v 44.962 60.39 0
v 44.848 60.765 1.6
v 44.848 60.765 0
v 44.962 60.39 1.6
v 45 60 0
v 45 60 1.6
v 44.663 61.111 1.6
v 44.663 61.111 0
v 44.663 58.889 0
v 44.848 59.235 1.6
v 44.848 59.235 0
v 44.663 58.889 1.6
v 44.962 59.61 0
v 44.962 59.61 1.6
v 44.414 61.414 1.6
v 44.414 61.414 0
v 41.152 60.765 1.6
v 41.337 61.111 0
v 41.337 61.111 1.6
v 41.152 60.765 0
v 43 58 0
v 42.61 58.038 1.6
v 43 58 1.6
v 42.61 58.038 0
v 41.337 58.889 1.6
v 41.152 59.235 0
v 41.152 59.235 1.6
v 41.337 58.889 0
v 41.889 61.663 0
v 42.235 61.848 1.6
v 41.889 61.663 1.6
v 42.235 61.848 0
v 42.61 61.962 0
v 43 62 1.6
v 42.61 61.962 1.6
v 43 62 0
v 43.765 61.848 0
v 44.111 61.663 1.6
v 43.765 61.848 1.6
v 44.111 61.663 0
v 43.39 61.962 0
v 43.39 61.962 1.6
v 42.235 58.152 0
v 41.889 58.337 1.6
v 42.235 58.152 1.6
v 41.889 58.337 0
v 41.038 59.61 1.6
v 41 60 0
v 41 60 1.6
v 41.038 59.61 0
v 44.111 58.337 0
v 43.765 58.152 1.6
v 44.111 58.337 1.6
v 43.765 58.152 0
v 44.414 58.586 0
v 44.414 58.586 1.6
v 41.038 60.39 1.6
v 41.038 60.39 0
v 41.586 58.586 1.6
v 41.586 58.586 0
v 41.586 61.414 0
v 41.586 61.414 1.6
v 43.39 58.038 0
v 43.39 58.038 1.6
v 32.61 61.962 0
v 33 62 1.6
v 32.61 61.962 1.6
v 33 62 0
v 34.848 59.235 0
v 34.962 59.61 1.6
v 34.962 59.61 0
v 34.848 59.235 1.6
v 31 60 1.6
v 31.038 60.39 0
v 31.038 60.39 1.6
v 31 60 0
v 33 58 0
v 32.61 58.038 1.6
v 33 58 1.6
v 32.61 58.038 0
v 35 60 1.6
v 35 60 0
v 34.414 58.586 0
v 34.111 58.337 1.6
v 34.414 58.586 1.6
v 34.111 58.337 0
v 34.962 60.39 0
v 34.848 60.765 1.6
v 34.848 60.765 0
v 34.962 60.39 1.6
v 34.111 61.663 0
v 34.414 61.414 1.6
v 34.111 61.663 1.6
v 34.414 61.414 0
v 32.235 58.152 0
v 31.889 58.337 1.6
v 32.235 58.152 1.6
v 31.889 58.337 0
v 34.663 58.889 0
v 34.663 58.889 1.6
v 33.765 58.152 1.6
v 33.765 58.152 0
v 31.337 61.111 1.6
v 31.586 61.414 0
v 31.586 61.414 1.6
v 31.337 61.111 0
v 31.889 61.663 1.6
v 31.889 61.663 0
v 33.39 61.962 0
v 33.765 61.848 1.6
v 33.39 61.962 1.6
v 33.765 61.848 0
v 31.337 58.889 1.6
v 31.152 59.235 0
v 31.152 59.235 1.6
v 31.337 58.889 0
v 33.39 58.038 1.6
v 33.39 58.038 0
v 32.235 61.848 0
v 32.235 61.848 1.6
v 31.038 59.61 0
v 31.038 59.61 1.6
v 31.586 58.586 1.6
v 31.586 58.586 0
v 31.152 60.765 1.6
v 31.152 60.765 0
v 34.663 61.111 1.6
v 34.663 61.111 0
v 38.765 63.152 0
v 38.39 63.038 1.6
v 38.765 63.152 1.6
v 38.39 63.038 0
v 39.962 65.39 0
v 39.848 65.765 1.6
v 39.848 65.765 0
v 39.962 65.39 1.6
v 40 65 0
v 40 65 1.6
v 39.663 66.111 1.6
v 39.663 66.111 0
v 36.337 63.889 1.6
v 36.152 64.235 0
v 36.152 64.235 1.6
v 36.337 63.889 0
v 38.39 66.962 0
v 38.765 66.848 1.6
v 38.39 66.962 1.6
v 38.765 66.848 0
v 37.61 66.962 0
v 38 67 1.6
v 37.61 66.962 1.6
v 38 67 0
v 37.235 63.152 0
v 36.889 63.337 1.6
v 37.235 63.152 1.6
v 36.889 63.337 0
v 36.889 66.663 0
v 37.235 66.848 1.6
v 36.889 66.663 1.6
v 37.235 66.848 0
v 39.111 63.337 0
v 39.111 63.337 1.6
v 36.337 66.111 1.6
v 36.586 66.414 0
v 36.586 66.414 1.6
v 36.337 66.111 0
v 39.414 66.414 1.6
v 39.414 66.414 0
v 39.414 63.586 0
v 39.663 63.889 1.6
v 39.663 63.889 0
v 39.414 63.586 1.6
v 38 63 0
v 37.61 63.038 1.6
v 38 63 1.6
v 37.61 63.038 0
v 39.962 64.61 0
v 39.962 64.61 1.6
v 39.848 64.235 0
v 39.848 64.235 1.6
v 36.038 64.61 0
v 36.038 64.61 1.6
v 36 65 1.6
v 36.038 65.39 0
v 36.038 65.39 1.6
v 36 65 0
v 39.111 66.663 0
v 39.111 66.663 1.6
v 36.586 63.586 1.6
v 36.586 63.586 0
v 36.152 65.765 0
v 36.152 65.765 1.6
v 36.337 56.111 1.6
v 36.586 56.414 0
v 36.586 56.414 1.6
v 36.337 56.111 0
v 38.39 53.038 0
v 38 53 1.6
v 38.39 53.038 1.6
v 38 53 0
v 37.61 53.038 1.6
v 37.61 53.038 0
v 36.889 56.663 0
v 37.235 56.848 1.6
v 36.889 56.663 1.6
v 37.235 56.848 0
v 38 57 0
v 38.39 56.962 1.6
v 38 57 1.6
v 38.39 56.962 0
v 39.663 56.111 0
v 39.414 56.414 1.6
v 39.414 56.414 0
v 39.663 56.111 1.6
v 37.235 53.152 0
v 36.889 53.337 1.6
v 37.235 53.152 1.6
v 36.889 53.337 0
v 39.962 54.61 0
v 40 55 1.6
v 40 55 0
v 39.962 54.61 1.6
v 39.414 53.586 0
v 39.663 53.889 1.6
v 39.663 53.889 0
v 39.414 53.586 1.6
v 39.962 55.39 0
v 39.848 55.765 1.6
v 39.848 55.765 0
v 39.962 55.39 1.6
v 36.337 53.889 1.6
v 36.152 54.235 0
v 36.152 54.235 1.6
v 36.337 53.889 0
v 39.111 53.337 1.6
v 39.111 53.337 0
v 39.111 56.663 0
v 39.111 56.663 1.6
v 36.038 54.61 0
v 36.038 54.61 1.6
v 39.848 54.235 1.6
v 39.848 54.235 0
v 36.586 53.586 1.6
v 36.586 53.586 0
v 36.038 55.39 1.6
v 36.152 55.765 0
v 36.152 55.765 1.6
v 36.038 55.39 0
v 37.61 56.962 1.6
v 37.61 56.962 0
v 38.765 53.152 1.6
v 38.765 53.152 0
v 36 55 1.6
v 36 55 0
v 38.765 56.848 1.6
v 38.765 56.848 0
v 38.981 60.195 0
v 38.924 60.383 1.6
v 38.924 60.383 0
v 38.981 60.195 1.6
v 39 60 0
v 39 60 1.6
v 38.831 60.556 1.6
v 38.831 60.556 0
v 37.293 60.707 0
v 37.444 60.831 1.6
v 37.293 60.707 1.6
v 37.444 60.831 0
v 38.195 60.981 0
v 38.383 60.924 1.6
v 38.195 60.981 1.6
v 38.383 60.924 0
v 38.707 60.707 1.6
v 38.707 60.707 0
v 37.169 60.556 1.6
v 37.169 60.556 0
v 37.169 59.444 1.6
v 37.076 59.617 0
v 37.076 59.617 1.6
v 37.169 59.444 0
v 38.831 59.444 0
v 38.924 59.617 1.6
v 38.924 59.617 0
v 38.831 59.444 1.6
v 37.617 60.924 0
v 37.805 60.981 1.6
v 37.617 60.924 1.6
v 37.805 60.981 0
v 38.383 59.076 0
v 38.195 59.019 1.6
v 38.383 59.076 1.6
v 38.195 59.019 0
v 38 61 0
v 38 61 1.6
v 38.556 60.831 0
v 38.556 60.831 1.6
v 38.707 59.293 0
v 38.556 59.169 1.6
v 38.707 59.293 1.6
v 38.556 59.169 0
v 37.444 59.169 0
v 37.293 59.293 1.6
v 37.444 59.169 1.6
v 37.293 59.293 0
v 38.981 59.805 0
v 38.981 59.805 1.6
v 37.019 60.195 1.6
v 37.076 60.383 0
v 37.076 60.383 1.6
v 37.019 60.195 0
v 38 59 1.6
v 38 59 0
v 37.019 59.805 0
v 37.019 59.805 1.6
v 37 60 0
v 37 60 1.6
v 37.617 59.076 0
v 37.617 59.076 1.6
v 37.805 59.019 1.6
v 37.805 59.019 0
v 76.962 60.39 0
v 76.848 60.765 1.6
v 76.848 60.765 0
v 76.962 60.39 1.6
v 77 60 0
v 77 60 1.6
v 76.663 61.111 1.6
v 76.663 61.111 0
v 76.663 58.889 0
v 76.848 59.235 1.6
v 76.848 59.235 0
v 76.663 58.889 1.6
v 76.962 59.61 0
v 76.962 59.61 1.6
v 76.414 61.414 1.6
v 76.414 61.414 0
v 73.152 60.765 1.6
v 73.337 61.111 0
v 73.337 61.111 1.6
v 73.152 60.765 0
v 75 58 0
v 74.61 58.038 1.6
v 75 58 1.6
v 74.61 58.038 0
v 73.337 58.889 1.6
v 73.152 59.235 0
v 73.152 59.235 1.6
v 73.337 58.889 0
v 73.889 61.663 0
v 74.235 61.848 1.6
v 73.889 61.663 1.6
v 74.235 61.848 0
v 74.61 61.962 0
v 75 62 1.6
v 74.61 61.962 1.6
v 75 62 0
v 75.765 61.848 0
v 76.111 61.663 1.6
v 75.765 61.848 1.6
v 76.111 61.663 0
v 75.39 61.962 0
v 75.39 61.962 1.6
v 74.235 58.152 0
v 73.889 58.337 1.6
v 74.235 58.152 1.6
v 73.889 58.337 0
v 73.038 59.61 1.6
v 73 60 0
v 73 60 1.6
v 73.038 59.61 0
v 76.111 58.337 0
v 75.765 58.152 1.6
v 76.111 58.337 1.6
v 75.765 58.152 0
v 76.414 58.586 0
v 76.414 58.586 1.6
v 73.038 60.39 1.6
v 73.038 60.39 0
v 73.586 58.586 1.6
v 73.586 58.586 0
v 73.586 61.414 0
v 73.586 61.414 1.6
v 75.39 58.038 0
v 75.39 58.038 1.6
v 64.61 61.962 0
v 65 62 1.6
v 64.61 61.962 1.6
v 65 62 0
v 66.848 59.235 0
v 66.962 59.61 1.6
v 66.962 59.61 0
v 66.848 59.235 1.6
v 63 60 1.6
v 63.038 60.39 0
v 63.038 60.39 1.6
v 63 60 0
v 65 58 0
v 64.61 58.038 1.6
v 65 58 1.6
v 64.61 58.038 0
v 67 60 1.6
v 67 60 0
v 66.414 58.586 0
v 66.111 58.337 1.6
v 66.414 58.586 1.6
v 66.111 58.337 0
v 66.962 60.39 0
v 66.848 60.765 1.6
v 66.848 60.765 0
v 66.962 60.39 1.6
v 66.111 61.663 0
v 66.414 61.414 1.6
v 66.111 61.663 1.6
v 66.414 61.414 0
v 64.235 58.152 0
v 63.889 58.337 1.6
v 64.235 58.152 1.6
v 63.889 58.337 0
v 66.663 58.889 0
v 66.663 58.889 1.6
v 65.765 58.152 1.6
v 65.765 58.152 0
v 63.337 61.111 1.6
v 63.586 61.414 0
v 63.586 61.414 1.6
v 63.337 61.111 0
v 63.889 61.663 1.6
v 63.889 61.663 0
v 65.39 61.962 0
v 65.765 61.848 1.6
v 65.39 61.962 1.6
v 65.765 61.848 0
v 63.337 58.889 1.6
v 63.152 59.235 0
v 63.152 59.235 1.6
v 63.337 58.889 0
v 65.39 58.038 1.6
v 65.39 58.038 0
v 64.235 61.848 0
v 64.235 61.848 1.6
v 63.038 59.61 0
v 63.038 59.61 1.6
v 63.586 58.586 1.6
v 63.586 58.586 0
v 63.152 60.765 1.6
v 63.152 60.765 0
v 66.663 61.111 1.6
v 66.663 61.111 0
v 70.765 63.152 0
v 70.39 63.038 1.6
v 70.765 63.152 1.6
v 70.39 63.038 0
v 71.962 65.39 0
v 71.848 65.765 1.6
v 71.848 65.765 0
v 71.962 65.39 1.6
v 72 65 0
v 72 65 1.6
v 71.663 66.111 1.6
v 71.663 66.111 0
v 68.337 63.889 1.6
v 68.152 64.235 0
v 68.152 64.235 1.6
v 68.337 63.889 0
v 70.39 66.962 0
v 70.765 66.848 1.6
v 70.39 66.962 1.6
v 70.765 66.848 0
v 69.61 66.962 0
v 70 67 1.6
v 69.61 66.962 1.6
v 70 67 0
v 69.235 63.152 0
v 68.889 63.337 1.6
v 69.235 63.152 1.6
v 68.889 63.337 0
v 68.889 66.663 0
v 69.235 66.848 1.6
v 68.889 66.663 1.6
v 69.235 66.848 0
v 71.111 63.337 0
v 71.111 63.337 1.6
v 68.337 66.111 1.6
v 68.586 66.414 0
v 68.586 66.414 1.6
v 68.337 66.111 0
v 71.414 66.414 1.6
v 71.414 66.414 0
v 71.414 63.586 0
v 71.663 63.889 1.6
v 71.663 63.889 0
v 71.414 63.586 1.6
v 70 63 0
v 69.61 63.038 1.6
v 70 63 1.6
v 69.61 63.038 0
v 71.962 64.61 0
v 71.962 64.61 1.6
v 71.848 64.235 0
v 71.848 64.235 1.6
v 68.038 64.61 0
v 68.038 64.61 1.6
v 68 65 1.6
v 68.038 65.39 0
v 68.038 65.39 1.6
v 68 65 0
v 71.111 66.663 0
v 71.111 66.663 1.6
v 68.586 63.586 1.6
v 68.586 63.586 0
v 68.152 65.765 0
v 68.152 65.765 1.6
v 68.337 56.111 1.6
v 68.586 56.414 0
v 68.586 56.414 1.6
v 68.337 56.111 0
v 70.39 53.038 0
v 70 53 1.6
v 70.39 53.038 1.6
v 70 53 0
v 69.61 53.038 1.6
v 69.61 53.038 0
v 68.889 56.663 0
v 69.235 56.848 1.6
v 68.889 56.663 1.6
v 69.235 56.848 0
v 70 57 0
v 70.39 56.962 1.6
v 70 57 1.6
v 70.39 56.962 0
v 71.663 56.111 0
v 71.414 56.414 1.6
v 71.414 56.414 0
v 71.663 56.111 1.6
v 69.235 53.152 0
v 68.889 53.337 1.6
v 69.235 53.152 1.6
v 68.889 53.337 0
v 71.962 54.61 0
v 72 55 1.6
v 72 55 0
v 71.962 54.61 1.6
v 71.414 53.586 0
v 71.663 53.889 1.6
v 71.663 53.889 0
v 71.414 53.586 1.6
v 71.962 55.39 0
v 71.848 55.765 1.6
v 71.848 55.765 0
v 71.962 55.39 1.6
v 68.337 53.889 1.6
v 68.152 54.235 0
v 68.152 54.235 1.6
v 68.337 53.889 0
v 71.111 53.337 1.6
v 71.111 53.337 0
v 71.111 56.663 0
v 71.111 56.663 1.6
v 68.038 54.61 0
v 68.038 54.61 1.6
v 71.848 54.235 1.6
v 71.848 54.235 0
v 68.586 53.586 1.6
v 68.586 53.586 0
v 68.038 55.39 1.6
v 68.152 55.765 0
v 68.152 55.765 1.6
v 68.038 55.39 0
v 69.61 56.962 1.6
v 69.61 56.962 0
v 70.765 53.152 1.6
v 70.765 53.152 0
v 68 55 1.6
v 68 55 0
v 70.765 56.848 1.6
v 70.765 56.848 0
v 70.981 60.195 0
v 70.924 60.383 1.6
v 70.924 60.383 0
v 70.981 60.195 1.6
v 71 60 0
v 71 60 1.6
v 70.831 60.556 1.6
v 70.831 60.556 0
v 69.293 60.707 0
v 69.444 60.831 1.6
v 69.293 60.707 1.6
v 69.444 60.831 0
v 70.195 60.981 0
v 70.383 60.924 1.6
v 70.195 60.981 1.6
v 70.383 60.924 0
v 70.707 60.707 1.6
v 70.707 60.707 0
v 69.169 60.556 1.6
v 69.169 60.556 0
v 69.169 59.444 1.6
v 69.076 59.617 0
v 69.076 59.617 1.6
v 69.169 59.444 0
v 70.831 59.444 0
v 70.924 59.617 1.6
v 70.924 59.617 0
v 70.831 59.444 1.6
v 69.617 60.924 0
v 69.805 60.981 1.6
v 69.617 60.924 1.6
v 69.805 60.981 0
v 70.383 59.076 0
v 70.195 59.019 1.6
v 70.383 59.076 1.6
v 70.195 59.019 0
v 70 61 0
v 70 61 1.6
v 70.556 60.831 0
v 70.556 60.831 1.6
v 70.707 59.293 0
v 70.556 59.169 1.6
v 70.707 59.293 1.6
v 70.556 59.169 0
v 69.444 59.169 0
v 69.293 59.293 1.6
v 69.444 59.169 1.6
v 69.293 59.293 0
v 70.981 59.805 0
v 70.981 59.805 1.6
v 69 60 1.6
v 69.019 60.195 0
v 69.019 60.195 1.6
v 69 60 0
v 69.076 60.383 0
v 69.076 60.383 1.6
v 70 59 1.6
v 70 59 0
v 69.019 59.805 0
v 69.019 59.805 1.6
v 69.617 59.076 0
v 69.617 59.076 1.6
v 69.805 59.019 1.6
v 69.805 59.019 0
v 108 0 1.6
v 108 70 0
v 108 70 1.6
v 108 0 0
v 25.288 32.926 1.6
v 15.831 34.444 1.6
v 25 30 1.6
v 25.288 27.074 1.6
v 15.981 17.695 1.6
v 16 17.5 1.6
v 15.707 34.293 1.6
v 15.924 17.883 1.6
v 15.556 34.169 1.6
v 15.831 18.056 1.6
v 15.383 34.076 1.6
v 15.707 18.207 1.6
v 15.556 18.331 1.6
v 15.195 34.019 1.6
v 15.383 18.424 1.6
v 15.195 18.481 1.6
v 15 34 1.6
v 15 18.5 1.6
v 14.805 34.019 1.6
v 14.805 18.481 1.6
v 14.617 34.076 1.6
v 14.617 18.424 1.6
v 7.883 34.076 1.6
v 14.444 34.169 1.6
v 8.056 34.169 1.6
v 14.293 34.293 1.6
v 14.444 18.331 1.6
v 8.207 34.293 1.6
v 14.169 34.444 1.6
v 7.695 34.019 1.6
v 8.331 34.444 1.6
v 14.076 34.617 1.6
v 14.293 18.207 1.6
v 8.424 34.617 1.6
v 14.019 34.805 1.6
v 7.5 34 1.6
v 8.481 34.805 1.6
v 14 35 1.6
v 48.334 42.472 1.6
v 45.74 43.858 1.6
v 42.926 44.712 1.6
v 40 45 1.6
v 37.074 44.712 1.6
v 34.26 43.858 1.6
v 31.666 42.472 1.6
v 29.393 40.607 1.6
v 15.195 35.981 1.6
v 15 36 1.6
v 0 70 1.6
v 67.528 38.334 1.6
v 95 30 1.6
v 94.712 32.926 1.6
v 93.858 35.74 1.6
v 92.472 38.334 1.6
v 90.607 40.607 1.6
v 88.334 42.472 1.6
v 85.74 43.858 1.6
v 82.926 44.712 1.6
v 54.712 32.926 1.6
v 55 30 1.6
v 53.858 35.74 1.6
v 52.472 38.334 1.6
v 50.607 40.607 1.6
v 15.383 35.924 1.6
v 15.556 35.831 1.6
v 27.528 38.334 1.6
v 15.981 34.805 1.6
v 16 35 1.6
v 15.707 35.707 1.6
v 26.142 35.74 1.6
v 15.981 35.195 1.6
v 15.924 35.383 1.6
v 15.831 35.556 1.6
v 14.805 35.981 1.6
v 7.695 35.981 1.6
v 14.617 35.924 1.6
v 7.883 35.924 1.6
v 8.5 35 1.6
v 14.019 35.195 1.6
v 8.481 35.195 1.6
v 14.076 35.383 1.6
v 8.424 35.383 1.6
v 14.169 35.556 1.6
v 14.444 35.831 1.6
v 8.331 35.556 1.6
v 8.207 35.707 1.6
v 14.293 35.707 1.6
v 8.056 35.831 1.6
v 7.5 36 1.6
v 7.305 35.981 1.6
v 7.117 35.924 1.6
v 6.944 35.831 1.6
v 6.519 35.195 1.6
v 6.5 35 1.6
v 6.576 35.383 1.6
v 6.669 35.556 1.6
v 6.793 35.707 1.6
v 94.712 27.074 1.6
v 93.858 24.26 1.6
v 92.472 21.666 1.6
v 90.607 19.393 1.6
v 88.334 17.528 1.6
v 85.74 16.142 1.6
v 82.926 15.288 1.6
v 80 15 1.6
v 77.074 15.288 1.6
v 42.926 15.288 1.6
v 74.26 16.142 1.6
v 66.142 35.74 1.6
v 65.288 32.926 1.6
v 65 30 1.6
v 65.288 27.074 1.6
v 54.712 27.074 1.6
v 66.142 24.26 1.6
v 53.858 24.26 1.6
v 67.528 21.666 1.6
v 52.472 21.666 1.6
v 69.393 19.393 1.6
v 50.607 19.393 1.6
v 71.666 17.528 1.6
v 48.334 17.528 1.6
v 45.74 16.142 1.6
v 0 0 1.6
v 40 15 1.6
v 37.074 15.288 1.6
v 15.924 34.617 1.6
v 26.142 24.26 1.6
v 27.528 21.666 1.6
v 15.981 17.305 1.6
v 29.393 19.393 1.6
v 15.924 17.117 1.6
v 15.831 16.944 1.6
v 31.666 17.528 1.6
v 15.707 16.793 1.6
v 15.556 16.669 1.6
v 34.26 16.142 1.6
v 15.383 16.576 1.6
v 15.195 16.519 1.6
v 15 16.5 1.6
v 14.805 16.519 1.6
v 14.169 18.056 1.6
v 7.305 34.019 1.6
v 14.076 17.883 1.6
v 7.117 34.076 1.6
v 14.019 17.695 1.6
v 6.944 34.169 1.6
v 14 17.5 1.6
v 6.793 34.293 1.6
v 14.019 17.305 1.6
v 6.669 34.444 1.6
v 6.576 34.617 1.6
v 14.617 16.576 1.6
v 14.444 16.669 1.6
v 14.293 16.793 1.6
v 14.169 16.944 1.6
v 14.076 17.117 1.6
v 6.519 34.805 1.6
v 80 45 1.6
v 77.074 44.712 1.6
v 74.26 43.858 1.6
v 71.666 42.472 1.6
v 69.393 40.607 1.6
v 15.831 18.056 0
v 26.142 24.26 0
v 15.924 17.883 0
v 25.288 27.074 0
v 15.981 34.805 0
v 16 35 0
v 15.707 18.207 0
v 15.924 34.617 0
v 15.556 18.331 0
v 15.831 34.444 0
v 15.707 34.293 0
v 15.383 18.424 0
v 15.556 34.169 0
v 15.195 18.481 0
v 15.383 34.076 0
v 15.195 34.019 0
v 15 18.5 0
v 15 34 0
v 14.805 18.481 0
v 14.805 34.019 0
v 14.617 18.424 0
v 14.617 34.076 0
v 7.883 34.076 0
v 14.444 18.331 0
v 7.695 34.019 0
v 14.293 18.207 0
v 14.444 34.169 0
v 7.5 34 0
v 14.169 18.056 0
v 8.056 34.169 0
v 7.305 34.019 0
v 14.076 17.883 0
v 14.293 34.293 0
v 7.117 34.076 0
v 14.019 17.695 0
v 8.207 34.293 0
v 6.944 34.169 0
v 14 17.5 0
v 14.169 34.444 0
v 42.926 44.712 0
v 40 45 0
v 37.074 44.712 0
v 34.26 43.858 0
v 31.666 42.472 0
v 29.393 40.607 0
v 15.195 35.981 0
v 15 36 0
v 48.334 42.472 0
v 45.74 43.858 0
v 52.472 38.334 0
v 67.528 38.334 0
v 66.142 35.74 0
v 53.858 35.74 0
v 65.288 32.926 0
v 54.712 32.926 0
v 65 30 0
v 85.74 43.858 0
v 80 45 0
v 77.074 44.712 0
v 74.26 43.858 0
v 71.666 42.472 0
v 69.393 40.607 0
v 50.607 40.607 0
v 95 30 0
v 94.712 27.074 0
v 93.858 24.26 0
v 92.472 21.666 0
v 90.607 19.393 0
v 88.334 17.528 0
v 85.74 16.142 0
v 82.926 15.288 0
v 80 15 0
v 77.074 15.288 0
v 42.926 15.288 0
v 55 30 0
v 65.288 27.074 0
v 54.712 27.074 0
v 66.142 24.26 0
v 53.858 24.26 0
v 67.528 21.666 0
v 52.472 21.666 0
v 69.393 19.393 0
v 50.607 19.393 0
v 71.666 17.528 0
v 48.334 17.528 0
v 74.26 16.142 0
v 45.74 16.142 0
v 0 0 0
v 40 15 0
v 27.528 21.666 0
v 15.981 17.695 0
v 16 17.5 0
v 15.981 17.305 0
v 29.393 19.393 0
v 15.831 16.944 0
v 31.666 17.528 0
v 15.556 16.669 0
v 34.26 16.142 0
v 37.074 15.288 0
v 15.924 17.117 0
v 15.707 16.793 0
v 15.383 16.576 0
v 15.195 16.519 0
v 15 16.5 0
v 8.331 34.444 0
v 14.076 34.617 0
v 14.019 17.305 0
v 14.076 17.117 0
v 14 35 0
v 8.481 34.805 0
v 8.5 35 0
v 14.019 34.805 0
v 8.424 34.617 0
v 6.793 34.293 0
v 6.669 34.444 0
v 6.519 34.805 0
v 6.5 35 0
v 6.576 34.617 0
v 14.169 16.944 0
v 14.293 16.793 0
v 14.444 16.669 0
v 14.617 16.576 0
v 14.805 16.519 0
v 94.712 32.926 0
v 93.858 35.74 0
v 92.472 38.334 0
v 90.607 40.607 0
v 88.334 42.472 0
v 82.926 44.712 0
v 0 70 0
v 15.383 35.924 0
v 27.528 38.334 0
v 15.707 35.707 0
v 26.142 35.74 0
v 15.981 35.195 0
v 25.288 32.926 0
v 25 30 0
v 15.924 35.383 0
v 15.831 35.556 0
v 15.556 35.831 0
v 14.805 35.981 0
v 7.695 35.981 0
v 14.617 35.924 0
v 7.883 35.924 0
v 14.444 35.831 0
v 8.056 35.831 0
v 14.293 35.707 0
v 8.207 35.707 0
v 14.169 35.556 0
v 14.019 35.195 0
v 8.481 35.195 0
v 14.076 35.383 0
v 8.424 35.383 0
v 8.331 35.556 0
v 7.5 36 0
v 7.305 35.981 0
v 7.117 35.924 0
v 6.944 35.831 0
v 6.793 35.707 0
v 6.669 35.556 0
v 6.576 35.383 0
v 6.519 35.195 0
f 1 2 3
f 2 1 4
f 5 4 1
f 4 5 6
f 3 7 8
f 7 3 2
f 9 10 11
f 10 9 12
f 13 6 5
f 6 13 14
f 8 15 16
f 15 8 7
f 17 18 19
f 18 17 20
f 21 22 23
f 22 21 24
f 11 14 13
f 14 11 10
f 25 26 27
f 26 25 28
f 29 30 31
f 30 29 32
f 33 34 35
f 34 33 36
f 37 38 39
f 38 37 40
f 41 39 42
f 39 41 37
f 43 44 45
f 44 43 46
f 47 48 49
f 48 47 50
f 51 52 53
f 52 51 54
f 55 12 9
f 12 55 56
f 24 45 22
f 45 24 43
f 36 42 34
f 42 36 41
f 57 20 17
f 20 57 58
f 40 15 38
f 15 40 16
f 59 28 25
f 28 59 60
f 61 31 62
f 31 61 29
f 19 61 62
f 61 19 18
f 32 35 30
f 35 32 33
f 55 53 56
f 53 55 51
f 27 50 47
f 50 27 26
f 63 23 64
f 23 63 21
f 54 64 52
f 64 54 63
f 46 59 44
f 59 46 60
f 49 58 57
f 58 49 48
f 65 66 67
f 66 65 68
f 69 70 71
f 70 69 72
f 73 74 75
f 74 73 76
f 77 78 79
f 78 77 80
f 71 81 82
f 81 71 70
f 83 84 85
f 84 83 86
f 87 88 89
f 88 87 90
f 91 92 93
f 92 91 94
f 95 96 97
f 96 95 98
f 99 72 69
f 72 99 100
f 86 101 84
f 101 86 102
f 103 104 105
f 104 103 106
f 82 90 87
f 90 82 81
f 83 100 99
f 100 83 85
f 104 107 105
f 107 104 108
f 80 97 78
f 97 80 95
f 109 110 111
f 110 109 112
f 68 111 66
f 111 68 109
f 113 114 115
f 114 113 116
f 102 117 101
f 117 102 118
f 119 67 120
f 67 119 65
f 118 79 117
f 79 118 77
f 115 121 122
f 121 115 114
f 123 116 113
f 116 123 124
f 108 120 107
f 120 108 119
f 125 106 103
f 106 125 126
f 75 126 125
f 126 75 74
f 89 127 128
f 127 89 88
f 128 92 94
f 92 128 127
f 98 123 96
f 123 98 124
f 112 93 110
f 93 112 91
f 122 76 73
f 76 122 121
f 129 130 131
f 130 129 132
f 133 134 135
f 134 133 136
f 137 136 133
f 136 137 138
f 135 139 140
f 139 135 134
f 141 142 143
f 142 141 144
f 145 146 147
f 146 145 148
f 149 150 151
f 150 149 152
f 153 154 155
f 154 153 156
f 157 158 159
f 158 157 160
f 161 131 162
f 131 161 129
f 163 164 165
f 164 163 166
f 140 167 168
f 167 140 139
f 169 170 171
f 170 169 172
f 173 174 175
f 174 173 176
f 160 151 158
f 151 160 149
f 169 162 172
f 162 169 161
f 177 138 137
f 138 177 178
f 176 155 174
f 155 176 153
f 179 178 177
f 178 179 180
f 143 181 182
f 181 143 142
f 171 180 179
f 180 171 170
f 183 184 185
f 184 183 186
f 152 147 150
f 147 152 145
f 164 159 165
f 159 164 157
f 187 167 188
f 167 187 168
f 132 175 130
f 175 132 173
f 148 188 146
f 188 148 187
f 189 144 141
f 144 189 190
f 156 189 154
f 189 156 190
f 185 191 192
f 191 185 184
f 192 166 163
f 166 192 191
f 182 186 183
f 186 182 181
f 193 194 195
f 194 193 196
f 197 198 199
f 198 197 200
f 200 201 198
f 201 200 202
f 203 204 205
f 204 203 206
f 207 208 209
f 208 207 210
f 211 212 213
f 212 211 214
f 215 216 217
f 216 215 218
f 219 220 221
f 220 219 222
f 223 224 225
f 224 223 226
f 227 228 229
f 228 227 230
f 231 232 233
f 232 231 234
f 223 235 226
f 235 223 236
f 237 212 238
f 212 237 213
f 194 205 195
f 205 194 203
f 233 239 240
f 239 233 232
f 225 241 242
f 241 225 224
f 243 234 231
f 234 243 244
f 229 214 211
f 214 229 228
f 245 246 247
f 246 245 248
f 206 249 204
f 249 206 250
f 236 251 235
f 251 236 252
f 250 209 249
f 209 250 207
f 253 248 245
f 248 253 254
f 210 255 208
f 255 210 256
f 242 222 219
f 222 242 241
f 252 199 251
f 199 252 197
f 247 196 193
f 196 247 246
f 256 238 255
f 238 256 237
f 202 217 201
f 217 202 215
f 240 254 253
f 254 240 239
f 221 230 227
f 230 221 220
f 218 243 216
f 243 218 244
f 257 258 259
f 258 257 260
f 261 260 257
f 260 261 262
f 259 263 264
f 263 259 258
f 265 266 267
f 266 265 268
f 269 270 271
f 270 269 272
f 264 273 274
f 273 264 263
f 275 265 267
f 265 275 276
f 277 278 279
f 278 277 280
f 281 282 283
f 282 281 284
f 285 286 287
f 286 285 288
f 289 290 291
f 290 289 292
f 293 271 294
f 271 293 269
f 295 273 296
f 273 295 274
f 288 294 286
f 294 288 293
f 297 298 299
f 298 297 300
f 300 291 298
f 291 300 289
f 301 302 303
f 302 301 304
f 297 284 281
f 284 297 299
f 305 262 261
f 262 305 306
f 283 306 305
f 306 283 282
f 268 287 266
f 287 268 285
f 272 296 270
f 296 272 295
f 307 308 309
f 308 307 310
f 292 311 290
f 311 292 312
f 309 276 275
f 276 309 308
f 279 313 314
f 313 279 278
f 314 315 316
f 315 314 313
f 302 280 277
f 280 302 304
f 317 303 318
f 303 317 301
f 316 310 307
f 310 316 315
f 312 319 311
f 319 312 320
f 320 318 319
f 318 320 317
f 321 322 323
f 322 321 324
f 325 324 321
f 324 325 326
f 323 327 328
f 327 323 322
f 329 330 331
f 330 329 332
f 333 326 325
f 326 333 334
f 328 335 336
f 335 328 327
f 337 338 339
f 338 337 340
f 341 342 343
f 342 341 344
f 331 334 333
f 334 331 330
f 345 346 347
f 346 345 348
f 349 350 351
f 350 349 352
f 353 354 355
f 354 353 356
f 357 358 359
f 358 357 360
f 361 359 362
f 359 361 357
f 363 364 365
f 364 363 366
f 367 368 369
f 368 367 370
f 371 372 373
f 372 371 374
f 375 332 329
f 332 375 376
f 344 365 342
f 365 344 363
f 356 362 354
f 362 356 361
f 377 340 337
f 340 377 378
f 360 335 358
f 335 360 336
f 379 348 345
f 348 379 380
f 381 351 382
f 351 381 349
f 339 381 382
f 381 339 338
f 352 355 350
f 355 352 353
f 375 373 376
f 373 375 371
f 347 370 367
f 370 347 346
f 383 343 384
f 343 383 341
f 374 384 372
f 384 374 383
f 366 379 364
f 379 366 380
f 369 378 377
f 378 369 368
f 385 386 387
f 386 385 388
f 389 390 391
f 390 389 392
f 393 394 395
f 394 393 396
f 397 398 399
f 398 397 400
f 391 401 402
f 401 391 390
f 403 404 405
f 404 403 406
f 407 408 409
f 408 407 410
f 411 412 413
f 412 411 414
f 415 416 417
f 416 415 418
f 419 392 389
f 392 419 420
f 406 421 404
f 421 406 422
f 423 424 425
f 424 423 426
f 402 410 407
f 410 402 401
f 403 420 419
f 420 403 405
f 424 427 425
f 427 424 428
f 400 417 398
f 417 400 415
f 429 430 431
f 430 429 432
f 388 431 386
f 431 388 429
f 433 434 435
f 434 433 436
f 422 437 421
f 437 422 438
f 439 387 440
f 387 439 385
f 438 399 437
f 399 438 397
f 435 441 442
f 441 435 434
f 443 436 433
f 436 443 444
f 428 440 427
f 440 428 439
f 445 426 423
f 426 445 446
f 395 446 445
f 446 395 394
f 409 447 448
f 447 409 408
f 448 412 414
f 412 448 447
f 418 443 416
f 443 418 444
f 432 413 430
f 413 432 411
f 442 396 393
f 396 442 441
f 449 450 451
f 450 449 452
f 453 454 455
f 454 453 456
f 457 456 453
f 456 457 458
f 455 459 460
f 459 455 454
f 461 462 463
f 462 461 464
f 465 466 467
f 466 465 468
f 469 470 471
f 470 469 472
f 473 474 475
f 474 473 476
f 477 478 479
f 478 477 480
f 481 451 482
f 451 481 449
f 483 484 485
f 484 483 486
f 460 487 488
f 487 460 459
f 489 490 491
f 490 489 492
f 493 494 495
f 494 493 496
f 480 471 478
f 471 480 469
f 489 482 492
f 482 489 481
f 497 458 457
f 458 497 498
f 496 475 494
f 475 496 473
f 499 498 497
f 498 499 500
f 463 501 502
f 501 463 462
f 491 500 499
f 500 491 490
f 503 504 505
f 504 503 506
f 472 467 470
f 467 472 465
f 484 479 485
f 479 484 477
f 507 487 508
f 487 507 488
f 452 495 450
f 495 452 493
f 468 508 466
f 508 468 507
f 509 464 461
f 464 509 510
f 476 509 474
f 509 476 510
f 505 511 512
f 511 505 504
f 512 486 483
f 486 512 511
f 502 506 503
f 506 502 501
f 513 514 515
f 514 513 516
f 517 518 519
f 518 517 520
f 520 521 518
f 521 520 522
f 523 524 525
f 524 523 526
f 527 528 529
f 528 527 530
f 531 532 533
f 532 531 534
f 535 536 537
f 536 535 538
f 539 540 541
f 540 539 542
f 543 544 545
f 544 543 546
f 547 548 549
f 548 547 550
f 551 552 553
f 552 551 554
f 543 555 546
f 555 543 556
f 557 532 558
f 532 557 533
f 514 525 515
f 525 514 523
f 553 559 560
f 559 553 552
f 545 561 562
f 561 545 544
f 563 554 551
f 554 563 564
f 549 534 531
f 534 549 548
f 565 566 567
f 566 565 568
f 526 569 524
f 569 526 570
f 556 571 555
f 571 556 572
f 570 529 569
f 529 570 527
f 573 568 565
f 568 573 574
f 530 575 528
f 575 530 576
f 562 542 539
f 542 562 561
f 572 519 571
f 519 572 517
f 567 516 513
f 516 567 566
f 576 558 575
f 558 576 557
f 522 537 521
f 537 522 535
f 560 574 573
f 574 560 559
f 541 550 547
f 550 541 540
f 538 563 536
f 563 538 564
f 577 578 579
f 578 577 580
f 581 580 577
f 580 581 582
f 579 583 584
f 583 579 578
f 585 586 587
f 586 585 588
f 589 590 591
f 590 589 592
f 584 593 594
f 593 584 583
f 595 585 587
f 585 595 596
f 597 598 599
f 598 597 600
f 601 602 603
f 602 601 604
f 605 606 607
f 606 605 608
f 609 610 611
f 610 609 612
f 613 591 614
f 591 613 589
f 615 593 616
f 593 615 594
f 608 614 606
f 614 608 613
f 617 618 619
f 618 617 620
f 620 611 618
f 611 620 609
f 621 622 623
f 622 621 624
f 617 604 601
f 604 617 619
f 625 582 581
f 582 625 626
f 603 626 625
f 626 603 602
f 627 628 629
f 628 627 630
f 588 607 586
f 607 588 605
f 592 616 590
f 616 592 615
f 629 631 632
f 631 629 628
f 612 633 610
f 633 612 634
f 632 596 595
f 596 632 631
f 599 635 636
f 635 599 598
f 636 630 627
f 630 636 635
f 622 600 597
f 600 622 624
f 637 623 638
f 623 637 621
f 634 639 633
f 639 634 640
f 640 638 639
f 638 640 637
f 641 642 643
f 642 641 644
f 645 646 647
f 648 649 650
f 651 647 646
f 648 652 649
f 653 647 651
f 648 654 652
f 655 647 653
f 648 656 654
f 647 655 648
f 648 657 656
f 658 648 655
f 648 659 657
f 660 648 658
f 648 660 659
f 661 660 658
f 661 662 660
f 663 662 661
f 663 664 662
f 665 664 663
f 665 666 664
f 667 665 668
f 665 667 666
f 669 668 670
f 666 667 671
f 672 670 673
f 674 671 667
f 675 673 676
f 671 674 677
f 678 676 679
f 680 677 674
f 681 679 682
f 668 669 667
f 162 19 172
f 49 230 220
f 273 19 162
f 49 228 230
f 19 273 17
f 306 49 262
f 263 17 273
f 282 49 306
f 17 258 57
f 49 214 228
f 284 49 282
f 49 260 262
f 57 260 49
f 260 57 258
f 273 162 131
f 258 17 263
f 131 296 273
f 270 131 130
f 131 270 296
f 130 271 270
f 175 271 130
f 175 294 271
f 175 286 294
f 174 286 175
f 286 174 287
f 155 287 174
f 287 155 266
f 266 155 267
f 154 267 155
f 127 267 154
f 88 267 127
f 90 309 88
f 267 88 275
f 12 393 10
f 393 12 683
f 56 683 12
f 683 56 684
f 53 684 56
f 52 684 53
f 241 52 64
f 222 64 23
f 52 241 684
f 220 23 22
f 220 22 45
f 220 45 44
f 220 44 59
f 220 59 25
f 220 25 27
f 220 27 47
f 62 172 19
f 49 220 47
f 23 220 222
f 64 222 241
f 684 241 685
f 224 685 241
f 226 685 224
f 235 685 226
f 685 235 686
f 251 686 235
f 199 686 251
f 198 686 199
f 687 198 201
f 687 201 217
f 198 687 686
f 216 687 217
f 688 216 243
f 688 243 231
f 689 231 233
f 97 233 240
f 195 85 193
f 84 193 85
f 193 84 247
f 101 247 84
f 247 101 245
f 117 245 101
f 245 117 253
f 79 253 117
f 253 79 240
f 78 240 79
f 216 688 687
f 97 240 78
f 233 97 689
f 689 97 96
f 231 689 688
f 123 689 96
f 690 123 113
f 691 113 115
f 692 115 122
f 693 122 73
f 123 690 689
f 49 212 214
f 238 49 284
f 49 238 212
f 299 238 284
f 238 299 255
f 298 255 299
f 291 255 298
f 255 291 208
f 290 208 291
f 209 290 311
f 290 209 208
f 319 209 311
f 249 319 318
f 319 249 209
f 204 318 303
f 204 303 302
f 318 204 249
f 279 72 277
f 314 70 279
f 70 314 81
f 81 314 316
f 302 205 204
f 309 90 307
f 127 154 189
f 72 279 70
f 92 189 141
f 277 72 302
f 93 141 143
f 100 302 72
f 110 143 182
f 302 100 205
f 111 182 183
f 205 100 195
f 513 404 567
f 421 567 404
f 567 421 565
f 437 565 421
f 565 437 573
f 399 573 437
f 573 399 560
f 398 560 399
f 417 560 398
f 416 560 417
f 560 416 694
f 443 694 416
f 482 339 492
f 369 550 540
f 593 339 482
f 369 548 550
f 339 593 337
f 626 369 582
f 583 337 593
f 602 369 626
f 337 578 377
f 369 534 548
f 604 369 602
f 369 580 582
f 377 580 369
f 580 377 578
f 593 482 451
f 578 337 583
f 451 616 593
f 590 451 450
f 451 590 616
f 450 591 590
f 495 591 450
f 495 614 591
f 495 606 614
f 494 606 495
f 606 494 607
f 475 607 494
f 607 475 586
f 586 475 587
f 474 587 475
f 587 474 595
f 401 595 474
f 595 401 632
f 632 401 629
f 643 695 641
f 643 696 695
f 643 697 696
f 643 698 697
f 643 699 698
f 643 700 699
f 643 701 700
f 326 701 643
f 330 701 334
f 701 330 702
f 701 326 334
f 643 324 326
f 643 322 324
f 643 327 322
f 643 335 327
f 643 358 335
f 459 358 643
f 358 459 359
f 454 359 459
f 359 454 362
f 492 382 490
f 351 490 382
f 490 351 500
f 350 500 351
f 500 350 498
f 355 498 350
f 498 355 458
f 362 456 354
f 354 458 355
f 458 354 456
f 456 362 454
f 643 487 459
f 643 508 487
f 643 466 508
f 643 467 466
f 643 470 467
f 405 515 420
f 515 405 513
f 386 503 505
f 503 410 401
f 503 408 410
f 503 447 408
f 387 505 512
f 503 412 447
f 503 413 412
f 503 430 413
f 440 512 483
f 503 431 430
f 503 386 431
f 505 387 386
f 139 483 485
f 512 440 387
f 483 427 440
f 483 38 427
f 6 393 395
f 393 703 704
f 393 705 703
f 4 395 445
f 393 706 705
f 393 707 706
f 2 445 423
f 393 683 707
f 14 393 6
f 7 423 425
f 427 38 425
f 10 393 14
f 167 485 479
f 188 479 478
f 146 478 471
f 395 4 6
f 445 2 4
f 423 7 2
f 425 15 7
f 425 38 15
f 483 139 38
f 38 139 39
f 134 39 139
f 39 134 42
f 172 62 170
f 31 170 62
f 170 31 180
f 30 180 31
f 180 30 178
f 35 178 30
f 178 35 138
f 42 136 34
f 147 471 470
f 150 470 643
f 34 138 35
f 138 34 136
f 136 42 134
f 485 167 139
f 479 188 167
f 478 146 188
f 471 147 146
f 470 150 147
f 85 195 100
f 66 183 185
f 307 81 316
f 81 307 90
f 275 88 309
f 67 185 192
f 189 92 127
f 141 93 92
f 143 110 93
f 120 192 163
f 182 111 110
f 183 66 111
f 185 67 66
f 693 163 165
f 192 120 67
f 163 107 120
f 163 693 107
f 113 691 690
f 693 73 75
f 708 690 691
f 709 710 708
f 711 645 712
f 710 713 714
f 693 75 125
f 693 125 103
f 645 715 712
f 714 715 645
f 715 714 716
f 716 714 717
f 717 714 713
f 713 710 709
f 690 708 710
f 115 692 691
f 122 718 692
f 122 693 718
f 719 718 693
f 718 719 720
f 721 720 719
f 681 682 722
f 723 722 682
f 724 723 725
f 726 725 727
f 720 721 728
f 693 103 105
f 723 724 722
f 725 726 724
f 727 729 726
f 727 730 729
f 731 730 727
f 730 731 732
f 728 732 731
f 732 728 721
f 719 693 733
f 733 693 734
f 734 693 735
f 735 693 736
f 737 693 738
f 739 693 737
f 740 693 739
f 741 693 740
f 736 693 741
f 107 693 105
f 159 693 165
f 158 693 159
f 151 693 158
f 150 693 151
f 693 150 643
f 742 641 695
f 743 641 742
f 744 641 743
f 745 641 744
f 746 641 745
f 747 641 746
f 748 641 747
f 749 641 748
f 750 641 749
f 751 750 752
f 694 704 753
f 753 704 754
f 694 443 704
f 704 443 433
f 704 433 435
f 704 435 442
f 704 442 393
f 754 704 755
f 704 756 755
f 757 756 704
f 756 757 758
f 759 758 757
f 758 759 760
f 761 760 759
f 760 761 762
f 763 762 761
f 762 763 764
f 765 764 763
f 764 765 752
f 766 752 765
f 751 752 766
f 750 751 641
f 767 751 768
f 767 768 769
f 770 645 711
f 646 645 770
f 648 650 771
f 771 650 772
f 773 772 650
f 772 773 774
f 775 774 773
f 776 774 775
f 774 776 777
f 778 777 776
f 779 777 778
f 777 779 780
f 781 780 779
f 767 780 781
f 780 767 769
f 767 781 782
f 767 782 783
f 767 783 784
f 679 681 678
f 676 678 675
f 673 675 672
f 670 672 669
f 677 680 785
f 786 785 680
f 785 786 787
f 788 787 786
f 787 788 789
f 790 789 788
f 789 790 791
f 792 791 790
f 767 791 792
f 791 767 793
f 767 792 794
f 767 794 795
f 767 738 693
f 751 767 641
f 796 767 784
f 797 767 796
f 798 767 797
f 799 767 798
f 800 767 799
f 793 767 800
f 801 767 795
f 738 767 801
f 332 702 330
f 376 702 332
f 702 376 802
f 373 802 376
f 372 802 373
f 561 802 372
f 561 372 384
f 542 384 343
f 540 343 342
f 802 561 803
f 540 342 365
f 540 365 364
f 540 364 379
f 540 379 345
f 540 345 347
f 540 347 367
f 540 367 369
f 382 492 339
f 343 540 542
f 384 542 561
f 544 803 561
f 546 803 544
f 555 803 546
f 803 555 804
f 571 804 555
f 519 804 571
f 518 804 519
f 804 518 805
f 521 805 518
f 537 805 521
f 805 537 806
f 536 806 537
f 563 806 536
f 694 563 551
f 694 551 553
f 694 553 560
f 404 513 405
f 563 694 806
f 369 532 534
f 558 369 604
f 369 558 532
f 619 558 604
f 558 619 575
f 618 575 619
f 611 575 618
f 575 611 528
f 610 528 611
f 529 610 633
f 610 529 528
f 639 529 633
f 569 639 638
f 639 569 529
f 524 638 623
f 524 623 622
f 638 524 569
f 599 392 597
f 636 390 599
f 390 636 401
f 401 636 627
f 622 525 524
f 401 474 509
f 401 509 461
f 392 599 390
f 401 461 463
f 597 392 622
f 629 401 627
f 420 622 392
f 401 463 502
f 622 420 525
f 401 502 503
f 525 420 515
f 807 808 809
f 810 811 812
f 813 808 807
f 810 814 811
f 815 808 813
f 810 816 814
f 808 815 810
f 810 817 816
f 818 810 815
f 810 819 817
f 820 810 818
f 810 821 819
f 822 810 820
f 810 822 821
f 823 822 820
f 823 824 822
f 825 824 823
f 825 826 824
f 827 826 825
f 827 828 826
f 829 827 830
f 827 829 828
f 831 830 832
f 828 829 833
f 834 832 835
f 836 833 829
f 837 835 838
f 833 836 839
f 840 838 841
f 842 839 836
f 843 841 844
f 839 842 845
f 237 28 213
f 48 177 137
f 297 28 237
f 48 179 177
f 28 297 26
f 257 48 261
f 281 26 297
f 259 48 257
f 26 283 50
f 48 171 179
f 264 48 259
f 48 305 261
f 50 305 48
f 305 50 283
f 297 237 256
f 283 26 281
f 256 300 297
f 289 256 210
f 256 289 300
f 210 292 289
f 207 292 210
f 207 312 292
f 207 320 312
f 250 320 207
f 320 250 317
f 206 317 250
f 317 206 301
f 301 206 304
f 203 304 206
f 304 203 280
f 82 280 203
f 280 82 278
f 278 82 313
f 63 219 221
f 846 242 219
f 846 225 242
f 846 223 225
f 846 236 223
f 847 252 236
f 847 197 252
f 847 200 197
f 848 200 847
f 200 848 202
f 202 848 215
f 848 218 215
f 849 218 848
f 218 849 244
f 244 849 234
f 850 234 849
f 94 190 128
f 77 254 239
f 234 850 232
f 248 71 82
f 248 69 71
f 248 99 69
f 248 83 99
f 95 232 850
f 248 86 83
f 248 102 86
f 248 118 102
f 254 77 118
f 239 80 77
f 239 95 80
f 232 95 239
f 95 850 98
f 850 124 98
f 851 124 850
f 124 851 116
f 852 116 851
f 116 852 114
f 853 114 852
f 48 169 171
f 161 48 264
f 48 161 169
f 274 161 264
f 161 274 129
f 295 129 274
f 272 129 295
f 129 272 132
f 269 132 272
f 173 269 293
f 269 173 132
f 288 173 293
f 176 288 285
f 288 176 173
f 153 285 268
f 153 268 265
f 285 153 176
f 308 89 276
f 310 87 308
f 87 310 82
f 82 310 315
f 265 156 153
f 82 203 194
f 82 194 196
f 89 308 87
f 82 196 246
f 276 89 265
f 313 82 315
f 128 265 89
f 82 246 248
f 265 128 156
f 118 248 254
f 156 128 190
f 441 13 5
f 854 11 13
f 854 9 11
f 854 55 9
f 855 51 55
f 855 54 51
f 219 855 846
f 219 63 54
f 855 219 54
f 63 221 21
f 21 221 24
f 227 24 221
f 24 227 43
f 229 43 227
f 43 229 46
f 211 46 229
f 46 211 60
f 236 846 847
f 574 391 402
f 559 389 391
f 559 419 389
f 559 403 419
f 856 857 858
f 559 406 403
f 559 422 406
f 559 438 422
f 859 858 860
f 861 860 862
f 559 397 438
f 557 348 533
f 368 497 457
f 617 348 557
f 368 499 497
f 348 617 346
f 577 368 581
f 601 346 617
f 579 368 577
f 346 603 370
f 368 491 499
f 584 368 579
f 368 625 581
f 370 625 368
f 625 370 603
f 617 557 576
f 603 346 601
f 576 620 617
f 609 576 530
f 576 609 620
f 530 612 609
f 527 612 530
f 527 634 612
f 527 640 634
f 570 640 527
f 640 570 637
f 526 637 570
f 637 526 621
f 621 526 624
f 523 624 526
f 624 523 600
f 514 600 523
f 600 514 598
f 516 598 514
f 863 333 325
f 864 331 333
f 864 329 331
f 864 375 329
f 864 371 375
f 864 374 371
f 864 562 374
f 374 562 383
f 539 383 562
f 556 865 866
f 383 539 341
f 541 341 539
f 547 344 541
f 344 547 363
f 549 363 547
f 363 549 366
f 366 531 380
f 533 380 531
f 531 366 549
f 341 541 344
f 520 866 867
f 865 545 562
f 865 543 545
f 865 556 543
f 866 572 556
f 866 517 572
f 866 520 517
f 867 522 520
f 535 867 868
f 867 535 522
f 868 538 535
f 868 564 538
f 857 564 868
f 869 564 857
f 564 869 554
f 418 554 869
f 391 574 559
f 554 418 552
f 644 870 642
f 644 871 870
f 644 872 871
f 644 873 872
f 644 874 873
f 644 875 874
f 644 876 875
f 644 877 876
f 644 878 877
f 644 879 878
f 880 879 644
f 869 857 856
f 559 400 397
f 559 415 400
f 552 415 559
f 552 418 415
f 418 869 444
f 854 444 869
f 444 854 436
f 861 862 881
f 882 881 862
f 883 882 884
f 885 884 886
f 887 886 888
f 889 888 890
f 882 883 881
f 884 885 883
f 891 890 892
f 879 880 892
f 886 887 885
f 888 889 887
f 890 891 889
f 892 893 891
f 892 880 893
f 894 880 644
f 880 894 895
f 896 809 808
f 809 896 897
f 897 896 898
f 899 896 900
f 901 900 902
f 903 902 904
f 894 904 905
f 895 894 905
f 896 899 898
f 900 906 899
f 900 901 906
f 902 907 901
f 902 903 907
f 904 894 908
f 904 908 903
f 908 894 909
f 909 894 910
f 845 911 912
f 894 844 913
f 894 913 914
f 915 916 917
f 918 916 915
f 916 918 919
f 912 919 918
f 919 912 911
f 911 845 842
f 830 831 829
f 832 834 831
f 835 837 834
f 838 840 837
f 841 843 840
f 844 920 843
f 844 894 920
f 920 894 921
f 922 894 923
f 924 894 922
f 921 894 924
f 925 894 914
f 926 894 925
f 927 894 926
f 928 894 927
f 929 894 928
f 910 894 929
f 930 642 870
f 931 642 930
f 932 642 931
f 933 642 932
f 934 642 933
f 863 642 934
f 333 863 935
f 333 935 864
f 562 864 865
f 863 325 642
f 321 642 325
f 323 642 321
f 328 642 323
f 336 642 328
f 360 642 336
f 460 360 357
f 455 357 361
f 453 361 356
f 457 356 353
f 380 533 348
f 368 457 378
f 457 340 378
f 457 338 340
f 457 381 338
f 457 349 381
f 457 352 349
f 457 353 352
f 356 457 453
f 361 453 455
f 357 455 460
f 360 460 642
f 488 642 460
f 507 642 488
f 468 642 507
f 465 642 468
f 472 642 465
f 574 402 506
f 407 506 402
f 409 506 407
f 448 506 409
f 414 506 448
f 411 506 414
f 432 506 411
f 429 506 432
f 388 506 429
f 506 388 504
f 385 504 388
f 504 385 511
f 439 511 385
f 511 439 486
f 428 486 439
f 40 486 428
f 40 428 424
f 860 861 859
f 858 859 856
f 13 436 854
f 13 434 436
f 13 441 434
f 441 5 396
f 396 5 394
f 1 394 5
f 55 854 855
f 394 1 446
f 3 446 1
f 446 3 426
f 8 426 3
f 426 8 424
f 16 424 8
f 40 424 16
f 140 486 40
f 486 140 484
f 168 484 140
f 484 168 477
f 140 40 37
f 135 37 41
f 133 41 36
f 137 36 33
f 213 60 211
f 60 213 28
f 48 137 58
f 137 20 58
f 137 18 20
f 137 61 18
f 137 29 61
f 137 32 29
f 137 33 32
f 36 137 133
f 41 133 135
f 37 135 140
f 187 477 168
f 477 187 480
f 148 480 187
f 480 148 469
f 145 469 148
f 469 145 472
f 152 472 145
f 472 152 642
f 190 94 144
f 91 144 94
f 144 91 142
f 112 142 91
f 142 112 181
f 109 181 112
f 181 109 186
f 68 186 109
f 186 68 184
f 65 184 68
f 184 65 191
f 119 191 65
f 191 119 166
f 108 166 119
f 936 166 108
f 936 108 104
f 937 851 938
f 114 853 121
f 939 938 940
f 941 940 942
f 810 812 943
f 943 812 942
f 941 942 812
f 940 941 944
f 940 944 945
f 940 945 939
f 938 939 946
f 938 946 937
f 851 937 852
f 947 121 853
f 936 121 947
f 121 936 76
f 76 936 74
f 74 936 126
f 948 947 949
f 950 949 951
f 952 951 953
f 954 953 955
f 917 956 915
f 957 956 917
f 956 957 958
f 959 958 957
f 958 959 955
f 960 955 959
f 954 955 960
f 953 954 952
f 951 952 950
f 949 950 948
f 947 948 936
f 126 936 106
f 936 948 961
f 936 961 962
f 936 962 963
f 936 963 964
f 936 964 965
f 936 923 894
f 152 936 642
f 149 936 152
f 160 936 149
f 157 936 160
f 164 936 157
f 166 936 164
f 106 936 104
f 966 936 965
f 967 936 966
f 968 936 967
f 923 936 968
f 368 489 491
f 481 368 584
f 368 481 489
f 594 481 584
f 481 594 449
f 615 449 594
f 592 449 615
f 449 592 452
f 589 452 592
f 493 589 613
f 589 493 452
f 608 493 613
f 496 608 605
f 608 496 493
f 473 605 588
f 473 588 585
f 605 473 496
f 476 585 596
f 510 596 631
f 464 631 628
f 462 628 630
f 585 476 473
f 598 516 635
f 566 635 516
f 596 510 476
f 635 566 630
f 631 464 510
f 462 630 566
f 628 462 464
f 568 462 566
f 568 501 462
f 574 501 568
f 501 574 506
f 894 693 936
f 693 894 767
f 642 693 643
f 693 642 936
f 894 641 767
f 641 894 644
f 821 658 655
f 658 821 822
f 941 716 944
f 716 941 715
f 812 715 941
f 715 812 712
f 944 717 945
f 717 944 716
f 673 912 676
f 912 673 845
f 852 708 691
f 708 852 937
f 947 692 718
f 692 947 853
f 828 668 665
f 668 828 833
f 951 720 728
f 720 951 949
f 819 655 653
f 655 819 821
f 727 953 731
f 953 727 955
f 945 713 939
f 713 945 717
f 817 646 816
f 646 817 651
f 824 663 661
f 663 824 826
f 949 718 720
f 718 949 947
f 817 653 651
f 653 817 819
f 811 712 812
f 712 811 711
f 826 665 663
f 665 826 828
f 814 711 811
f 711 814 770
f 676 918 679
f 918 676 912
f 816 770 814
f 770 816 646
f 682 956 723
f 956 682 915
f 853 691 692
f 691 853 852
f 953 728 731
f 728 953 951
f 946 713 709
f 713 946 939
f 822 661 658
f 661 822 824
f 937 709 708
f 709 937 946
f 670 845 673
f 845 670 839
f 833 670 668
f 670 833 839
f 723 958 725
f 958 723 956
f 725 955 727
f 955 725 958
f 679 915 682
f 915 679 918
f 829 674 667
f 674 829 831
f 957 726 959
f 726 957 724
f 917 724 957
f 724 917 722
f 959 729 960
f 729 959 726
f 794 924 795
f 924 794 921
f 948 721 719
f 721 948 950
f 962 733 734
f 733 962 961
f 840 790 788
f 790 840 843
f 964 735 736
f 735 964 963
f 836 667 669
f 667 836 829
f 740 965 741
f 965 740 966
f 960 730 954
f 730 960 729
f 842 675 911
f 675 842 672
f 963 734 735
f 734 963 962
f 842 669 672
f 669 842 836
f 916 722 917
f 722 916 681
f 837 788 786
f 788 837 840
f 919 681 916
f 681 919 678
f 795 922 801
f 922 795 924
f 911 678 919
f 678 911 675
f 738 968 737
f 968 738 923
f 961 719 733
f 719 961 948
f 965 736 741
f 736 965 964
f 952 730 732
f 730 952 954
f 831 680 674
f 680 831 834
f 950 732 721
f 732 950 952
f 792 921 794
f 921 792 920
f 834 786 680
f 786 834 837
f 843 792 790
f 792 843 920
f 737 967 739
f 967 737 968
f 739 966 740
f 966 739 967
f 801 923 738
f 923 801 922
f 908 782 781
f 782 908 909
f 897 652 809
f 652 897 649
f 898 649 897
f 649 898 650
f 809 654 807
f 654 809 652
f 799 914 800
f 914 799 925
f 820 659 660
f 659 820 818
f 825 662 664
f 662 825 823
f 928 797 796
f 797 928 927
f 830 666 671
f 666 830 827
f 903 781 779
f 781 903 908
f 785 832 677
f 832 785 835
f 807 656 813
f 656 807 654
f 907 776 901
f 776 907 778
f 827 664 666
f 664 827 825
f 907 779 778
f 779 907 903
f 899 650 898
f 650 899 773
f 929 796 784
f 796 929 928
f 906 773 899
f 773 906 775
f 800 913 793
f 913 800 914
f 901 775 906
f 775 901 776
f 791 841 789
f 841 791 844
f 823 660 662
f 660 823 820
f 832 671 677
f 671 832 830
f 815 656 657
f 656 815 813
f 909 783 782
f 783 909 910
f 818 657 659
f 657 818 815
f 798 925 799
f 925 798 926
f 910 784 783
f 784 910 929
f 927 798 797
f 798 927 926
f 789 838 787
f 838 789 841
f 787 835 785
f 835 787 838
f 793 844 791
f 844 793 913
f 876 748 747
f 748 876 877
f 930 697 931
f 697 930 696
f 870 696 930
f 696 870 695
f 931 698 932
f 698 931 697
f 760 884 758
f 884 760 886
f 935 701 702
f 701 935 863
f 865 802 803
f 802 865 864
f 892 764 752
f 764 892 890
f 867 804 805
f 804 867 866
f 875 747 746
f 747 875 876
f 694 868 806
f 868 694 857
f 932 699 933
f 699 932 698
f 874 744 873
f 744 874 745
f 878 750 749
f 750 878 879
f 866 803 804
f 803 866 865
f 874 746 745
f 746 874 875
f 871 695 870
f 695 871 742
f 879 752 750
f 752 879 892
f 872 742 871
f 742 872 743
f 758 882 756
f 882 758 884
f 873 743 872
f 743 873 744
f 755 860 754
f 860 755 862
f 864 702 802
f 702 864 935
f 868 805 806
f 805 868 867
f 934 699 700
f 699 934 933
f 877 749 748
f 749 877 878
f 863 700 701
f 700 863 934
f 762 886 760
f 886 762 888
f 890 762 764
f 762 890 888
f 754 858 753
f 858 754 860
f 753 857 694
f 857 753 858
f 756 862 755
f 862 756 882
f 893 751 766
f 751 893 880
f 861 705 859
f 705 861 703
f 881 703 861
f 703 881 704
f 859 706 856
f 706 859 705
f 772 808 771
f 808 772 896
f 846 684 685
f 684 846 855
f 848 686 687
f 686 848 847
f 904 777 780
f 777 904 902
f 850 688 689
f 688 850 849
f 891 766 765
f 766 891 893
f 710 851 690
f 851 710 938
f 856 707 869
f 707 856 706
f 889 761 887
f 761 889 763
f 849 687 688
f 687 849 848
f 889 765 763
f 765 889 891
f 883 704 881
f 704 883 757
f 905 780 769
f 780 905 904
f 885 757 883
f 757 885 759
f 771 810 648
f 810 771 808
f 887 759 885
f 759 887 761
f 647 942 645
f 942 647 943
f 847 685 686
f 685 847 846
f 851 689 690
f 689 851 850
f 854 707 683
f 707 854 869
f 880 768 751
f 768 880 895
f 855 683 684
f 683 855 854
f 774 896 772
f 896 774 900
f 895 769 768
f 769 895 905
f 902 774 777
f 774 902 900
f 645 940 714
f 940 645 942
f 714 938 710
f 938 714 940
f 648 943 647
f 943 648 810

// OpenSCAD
// file: syms.scad
module symY(t) {
    translate(t)
        children();
    mirror([0,1,0])
        translate(t)
            children();
}
module symX(t) {
    translate(t)
        children();
    mirror([1,0,0])
        translate(t)
            children();
}

module symZ(t) {
    translate(t)
        children();
    mirror([0,0,1])
        translate(t)
            children();
}

module	symXY(t) {
	tx=t[0];
	ty=t[1];
	tz=t[2];
	symX([tx,0,0])
	symY([0,ty,tz])
		children();
}

module magnetCut(D,S) {
    cylinder(d=D,h=10);
    for(d=[45,-45])
    rotate(d)
    cube([2*D,S,30],center=true);
}


// calculates the radius from "segment" paramers:
// https://en.wikipedia.org/wiki/Circular_segment
function    circleSlice2radius2(c,h) = (c*c/8/h)+ h/2;

function toInt(str) = 
    let(d = [for (s = str) ord(s) - 48], l = len(d) - 1)
    [for (i = 0, a = d[i];i <= l;i = i + 1, a = 10 * a + d[i]) a][l];
        
// main file
use <syms.scad>

$fn=32;

H_X=[20,20+32]+[18,18];
H_Y=42+18;
W=1.6;
D=2;
R=10/2;

difference() {
    cube([H_X[1]+H_X[0],H_Y+10,W]);
    for(x=H_X)
        translate([x,H_Y,0]) {
            cylinder(d=D,center=true,h=100);
            symX([R,0,0]) {
                cylinder(r=2,h=30,center=true);
            }
            symY([0,R,0]) {
                cylinder(r=2,h=30,center=true);
            }
        }

    
    
    translate([15,35,0])
    cylinder(d=D,center=true,h=100);
    translate([15/2,35,0])
    cylinder(d=D,center=true,h=100);
    translate([15,35/2,0])
    cylinder(d=D,center=true,h=100);
    
        translate([80,30,0])
    cylinder(d=30,center=true,h=100);
        translate([40,30,0])
    cylinder(d=30,center=true,h=100);
}
